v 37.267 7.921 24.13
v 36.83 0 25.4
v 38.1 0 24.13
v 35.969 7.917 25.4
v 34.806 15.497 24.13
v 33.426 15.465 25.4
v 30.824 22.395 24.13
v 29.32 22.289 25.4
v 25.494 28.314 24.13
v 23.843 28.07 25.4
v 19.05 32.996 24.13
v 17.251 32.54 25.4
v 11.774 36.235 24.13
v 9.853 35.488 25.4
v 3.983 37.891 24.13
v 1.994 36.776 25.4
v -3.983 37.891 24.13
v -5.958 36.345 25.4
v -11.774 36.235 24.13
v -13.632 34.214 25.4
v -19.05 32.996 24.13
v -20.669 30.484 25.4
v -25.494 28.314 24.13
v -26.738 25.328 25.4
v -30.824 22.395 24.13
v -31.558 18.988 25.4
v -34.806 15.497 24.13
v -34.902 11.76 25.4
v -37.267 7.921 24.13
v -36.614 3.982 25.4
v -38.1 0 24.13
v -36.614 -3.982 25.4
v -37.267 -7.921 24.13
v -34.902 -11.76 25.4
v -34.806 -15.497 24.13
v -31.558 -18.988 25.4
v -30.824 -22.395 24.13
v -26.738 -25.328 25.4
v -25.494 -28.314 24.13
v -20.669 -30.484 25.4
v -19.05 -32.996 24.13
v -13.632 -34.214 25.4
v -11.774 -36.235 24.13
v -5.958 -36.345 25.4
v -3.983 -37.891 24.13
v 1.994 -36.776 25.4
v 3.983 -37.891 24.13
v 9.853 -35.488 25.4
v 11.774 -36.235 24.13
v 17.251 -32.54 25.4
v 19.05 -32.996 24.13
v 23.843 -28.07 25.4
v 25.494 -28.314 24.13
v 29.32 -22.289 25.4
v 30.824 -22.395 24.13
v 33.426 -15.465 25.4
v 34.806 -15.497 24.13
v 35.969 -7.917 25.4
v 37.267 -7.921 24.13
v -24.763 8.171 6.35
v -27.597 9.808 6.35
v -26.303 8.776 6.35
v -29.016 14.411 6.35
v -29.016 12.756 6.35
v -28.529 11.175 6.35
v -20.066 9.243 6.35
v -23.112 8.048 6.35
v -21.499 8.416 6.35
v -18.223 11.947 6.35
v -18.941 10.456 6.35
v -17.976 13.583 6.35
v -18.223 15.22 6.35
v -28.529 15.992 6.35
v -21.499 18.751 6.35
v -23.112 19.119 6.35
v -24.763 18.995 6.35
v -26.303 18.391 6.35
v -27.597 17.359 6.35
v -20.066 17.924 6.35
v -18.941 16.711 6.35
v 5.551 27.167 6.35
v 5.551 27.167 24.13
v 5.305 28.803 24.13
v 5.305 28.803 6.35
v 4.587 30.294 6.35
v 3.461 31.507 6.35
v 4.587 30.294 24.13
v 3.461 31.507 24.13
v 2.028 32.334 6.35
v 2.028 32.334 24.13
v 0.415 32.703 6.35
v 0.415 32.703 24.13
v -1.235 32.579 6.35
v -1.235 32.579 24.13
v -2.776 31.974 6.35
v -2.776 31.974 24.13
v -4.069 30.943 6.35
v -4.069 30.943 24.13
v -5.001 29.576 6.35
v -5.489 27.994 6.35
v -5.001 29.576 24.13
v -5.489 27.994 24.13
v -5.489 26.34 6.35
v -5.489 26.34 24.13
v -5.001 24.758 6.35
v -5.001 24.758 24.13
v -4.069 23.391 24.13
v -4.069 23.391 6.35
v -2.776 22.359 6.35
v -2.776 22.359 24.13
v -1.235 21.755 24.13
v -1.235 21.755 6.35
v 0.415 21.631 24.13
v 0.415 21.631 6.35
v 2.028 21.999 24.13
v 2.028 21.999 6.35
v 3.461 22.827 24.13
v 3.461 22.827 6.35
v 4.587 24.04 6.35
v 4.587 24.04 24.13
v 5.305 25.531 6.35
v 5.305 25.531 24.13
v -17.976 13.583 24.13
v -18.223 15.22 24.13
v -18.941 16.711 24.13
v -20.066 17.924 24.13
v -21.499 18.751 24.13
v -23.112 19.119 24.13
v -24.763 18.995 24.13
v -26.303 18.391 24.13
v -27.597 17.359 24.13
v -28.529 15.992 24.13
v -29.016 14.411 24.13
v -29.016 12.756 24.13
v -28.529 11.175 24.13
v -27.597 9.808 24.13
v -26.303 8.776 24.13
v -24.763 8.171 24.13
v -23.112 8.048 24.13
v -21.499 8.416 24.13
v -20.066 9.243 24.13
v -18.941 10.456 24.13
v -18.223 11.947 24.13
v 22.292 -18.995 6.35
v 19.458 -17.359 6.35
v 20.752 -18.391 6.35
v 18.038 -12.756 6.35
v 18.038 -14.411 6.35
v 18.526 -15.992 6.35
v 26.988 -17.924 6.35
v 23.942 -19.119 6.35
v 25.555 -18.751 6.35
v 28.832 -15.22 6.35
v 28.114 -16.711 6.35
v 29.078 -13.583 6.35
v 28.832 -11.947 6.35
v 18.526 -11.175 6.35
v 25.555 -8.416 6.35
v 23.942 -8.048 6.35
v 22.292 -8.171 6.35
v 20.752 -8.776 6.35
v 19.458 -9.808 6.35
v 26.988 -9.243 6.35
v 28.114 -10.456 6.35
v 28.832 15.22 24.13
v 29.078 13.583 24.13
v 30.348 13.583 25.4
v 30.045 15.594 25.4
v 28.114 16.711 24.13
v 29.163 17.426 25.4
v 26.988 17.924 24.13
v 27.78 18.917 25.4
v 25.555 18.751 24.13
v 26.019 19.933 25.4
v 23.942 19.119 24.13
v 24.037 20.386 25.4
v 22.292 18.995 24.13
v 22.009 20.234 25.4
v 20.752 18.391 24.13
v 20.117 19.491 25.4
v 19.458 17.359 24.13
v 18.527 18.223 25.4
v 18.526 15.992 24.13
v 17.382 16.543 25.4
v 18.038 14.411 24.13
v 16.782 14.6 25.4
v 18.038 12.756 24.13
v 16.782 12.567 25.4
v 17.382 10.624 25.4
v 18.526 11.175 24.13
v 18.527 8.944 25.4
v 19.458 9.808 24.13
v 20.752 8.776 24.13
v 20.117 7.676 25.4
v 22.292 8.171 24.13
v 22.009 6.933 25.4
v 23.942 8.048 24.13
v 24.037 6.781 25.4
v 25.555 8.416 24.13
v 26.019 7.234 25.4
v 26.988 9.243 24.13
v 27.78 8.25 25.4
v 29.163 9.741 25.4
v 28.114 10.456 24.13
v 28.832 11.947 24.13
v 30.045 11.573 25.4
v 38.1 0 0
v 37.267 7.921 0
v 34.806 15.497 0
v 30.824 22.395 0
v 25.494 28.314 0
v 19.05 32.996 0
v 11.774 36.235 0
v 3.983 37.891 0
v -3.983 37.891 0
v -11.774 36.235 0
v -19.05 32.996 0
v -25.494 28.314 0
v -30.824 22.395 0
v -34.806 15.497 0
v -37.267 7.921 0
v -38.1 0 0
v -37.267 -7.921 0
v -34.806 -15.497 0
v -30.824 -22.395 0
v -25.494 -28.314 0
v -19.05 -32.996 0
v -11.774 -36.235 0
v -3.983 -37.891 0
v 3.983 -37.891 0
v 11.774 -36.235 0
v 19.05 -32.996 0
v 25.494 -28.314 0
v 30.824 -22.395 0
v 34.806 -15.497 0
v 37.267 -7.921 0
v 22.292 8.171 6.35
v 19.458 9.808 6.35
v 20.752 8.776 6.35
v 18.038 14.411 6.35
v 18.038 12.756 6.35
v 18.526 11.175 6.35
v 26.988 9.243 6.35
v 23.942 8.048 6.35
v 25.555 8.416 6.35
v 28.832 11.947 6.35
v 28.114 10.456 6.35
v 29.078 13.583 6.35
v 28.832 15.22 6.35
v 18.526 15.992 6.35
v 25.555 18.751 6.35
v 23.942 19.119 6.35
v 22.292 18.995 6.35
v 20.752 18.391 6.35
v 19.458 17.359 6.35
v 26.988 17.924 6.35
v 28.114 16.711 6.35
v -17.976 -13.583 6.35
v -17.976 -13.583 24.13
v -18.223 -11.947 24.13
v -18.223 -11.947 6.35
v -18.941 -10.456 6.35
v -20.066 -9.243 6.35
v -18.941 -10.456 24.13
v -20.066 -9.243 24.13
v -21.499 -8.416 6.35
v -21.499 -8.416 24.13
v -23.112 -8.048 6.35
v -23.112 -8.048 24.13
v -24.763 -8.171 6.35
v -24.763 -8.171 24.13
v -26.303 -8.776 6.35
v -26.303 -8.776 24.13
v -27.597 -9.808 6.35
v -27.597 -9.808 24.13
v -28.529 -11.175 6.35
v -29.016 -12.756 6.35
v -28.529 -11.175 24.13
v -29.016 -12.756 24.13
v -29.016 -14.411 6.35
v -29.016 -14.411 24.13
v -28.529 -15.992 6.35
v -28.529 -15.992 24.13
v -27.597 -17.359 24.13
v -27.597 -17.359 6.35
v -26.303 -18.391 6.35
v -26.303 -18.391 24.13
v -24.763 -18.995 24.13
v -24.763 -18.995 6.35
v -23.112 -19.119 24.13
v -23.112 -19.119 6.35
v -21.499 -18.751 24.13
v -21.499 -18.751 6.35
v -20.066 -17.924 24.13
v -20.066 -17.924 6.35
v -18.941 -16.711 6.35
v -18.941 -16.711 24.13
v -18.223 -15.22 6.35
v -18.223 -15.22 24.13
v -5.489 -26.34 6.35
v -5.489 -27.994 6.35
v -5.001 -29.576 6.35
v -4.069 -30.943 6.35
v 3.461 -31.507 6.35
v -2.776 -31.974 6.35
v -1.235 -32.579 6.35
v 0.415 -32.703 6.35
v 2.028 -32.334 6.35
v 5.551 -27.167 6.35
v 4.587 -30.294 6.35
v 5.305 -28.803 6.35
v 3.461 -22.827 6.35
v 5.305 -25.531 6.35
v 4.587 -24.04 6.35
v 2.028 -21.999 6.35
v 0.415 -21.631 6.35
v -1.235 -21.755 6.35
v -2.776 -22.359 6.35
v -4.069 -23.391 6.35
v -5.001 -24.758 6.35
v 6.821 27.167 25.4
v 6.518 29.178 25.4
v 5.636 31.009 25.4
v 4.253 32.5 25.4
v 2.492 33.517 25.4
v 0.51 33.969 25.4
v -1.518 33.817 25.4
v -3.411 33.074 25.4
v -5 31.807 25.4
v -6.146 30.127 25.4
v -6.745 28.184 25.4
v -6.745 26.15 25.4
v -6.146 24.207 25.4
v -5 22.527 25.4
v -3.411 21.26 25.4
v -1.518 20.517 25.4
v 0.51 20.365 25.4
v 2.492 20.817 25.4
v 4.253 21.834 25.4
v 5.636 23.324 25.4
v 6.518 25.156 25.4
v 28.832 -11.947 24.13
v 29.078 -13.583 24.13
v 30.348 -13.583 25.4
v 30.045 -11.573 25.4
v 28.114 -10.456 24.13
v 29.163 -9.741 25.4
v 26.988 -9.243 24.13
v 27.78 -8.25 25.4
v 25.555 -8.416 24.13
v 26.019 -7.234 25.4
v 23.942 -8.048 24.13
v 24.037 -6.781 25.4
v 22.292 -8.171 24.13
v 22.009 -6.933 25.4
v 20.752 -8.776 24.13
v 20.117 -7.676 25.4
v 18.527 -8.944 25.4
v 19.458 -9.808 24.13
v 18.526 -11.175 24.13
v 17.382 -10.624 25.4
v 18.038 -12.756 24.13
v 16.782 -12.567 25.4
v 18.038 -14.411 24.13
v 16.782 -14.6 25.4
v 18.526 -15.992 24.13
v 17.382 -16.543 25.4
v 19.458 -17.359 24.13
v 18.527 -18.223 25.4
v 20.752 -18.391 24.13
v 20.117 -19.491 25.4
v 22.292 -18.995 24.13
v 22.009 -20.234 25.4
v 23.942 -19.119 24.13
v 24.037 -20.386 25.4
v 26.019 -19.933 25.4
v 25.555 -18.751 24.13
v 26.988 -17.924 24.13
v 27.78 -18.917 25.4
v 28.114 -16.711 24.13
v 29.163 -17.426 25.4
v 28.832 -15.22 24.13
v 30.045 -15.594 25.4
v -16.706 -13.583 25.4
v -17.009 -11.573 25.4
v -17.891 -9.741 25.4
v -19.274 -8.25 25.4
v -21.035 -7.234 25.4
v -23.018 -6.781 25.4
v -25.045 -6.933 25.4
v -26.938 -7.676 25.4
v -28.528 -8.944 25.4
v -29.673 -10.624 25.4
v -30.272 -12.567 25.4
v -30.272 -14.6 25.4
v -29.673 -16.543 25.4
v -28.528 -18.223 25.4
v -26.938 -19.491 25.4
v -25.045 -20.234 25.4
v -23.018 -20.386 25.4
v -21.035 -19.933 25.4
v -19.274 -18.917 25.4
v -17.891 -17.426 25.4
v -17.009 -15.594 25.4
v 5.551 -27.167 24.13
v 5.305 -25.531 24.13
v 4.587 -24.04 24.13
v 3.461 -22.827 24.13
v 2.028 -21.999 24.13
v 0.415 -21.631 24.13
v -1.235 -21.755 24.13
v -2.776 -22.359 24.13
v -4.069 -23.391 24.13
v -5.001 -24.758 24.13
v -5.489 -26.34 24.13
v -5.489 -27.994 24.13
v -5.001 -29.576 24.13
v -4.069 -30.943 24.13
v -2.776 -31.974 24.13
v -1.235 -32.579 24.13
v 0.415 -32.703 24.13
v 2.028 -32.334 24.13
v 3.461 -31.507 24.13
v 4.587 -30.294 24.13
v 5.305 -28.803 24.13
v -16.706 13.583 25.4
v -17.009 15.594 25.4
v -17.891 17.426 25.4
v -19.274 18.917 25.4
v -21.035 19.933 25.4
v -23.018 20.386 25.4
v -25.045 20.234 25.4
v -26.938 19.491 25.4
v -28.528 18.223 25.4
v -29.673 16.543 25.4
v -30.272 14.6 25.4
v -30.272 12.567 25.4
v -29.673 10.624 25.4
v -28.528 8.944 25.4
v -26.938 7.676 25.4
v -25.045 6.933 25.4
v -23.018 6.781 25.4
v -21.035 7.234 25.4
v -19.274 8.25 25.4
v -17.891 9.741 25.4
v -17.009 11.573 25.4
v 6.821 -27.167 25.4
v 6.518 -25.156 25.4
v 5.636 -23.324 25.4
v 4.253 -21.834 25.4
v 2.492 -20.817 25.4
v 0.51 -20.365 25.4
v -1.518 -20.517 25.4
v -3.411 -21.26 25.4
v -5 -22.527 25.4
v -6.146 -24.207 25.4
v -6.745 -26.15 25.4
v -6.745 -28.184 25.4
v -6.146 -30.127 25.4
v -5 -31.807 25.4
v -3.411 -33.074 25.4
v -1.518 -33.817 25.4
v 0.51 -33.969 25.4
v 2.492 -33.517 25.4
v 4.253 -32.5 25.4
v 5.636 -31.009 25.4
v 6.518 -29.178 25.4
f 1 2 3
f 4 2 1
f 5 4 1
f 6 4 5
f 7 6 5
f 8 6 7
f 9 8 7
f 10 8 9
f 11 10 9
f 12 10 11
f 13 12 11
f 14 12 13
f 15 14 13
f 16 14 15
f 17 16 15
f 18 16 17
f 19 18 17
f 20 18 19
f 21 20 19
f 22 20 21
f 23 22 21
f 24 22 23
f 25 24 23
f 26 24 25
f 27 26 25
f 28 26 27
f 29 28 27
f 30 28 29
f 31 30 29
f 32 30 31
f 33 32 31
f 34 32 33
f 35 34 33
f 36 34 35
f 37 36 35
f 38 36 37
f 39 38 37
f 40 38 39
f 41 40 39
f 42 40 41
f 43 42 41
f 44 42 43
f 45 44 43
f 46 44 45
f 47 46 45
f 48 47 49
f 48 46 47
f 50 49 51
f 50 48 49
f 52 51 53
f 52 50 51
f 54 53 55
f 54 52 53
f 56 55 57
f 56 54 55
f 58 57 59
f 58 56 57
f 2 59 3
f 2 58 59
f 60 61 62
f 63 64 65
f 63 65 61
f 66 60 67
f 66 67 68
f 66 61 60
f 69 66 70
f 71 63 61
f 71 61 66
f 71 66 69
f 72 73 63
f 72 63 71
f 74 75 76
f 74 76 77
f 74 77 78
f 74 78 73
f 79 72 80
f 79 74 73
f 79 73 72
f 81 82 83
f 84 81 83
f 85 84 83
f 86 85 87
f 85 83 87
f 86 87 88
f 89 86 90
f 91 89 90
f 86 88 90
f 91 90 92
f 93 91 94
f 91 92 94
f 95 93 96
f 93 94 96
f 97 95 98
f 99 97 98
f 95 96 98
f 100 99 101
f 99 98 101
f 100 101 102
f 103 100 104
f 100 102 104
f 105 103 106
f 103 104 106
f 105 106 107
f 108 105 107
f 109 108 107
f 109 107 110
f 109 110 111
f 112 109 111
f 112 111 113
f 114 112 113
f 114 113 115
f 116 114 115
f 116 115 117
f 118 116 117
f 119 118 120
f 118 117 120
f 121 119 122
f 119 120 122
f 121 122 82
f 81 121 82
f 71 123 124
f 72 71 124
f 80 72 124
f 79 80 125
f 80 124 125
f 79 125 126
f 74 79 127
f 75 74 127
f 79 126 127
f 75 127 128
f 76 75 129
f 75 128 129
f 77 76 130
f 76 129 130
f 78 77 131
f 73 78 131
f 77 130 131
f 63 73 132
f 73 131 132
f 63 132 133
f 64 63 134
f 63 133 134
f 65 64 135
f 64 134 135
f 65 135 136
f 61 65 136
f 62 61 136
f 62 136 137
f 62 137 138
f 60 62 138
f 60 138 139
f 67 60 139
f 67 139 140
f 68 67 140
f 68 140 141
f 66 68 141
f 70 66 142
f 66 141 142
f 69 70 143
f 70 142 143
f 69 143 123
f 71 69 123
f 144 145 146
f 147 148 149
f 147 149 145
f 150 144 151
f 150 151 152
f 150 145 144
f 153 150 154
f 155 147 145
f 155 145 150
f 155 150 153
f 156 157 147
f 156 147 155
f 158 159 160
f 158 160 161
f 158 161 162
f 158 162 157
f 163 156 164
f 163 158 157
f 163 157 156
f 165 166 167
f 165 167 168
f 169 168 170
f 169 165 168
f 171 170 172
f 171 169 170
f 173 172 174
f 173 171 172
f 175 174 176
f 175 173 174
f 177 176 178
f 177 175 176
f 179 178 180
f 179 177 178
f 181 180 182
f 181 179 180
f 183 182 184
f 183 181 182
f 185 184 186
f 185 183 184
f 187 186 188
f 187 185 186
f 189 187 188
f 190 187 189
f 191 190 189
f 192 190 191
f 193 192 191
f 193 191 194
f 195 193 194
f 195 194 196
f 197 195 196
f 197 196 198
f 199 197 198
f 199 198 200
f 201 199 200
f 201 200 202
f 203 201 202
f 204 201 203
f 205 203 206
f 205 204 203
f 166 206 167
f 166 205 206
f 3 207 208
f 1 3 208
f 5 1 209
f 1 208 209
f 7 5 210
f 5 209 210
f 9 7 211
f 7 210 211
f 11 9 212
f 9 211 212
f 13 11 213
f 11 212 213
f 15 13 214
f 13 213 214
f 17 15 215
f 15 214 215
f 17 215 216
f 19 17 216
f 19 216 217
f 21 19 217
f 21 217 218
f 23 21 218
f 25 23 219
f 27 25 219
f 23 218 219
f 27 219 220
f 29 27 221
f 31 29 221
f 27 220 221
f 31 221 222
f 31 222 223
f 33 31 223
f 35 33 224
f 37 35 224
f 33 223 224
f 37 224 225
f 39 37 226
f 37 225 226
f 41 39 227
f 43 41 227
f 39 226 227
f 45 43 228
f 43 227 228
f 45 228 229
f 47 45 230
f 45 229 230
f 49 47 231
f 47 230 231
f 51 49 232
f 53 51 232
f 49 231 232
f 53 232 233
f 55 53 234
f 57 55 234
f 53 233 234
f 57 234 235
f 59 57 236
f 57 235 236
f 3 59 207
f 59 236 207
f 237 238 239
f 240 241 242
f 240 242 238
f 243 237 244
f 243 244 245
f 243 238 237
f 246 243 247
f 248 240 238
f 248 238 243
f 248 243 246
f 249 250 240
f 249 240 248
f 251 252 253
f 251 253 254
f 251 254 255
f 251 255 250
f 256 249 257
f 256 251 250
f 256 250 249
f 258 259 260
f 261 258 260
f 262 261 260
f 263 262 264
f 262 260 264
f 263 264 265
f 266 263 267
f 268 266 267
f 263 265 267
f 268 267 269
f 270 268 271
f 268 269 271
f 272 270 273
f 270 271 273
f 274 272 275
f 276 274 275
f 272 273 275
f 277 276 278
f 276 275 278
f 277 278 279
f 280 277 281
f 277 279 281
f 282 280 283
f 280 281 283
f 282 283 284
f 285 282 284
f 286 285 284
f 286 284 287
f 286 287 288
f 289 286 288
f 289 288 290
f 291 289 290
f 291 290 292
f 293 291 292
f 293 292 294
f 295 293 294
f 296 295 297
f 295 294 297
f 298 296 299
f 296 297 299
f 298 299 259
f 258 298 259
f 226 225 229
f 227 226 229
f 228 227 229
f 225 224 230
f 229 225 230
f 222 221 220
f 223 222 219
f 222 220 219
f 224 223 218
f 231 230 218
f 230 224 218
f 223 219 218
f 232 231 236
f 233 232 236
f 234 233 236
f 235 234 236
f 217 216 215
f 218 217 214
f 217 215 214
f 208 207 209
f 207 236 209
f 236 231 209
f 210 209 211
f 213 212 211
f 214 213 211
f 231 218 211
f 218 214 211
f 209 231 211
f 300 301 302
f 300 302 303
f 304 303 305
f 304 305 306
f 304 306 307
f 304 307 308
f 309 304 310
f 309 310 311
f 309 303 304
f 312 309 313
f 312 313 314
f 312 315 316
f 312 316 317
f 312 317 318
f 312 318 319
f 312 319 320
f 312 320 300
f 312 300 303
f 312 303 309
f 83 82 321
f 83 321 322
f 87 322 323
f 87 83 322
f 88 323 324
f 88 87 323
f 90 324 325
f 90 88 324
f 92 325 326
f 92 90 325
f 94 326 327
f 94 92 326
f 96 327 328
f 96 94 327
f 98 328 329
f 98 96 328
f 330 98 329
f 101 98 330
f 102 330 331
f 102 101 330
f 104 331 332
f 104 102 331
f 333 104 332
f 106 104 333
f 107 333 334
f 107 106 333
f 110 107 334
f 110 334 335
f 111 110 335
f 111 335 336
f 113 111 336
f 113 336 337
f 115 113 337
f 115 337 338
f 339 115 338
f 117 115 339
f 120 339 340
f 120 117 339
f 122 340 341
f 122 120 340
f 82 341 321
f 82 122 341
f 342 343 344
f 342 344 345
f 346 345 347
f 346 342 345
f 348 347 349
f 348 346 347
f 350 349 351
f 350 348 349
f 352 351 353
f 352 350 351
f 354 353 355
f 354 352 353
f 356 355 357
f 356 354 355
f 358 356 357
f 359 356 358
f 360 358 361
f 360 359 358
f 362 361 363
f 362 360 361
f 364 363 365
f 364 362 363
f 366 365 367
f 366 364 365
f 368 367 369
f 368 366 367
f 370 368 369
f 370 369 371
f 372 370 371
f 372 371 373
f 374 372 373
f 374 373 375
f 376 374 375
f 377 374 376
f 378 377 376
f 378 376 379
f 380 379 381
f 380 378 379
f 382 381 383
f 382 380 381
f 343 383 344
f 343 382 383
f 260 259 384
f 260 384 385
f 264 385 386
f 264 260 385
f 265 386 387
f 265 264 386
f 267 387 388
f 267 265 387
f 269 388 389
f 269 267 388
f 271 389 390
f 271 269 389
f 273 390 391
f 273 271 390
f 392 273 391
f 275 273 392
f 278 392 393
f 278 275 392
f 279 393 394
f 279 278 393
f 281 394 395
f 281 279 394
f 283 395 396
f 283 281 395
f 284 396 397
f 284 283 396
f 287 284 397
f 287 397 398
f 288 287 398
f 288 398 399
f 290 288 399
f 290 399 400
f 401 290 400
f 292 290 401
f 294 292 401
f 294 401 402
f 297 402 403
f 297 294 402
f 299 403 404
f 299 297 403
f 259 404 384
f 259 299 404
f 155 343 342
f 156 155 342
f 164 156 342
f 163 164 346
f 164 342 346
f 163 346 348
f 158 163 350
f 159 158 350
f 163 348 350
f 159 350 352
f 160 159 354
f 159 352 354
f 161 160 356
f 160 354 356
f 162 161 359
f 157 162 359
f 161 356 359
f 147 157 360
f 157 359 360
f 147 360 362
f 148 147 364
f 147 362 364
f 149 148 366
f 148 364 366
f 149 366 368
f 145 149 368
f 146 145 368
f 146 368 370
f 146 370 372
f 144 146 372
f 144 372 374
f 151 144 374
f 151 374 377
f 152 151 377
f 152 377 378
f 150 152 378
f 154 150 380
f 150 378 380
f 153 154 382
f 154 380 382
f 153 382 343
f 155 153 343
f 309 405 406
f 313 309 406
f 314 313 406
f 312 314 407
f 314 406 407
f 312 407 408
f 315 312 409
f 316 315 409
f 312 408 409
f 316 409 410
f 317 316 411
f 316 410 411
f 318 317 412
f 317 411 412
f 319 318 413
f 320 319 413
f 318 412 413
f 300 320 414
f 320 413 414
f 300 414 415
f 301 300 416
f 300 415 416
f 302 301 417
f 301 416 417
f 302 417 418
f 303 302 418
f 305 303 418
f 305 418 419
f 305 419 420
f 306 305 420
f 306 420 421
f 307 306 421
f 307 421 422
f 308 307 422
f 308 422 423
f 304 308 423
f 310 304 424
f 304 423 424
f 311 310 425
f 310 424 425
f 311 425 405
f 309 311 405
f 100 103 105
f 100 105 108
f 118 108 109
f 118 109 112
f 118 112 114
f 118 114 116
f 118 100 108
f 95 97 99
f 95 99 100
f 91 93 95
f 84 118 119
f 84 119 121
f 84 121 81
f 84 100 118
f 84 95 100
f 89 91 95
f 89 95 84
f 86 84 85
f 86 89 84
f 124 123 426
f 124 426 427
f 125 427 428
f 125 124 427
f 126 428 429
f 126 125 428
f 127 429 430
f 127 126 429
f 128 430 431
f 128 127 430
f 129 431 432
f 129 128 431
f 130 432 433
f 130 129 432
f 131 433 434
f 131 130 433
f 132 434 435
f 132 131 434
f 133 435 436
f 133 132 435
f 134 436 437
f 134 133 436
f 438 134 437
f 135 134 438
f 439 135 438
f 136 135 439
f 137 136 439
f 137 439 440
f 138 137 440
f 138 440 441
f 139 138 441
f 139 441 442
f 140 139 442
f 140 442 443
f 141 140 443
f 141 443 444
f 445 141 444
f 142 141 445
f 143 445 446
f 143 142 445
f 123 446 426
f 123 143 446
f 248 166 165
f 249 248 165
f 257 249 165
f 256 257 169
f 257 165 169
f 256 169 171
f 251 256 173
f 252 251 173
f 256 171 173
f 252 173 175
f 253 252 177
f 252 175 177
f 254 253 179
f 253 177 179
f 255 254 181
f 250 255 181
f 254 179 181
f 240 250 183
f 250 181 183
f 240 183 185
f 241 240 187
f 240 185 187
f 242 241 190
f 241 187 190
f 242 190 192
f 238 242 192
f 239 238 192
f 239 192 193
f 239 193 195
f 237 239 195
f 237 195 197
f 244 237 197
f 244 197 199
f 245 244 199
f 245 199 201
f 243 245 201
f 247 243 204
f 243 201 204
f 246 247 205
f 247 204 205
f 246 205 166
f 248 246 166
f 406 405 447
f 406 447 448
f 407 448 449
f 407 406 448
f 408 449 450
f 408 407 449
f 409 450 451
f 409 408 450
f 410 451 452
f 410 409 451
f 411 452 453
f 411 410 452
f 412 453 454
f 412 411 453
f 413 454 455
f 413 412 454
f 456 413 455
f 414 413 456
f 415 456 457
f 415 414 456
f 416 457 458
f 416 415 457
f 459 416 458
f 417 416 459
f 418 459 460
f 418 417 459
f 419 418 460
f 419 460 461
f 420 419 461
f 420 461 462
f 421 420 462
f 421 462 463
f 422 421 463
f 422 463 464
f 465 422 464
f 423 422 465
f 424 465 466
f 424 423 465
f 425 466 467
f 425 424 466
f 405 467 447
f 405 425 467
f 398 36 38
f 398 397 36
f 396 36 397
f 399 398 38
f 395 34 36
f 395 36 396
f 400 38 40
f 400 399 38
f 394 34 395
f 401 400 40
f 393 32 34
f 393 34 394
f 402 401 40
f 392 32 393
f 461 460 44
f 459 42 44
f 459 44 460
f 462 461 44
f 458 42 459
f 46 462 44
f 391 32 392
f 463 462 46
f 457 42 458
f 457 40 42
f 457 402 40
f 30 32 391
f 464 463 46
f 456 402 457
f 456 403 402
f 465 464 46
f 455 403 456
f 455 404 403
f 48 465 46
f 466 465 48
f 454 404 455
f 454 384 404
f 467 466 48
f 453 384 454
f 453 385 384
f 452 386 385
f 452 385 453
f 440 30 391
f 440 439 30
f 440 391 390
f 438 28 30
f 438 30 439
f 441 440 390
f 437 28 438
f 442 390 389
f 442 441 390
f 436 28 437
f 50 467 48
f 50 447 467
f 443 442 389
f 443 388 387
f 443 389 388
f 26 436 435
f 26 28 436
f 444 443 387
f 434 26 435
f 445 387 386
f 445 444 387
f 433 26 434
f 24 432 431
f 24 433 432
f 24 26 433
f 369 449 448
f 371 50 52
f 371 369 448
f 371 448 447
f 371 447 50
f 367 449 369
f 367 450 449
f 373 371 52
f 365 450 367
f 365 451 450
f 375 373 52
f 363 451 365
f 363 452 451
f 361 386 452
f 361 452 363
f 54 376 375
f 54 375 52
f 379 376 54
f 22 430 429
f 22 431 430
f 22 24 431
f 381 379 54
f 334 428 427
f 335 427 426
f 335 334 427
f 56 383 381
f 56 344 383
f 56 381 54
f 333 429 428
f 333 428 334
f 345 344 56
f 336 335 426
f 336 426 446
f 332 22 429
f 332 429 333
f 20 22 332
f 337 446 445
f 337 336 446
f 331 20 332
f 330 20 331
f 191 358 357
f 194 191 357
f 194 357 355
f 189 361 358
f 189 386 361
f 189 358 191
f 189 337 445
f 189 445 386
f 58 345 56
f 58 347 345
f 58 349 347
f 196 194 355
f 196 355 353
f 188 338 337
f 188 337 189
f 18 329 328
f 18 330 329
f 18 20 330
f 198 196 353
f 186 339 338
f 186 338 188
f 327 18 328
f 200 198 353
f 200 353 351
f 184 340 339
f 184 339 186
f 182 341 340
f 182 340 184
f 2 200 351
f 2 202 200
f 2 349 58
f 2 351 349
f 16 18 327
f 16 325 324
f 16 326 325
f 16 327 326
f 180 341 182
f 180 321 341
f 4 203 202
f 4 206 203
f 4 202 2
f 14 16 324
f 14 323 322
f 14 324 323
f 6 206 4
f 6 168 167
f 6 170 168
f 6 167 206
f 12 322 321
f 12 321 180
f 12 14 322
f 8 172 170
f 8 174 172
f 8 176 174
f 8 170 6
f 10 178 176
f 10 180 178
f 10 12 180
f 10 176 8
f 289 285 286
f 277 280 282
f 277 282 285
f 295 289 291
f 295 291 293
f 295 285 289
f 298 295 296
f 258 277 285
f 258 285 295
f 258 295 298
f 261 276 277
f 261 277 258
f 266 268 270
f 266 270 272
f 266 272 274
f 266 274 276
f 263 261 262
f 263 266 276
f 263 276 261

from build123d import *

# Parameters (mm, degrees)
F0_R     = 38.1
F1_DEPTH = 25.4
F2_R     = 5.551213
F3_DEPTH = 19.05
F4_SIZE  = 1.27


with BuildPart() as f1:
    # F0 (on Top) → F1 (new body)
    with BuildSketch(Plane.XY):
        Circle(F0_R)
    extrude(amount=F1_DEPTH)

    # F2 (on face) → F3 (cut)
    with BuildSketch(Plane.XY.offset(25.4)):
        with Locations((0, 27.166931)):
            Circle(F2_R)
        with Locations((-23.527252, 13.583465)):
            Circle(F2_R)
        with Locations((-23.527252, -13.583465)):
            Circle(F2_R)
        with Locations((0, -27.166931)):
            Circle(F2_R)
        with Locations((23.527252, -13.583465)):
            Circle(F2_R)
        with Locations((23.527252, 13.583465)):
            Circle(F2_R)
    extrude(amount=-F3_DEPTH, mode=Mode.SUBTRACT)

    # F4
    f4_edges = [f1.edges().sort_by_distance(p)[0] for p in [
        (-5.551213, 27.166931, 25.4),
        (-38.1, 0, 25.4),
        (-29.078465, -13.583465, 25.4),
        (-5.551213, -27.166931, 25.4),
        (17.976039, -13.583465, 25.4),
        (-29.078465, 13.583465, 25.4),
        (17.976039, 13.583465, 25.4),
    ]]
    chamfer(f4_edges, length=F4_SIZE)


solid = f1.part
